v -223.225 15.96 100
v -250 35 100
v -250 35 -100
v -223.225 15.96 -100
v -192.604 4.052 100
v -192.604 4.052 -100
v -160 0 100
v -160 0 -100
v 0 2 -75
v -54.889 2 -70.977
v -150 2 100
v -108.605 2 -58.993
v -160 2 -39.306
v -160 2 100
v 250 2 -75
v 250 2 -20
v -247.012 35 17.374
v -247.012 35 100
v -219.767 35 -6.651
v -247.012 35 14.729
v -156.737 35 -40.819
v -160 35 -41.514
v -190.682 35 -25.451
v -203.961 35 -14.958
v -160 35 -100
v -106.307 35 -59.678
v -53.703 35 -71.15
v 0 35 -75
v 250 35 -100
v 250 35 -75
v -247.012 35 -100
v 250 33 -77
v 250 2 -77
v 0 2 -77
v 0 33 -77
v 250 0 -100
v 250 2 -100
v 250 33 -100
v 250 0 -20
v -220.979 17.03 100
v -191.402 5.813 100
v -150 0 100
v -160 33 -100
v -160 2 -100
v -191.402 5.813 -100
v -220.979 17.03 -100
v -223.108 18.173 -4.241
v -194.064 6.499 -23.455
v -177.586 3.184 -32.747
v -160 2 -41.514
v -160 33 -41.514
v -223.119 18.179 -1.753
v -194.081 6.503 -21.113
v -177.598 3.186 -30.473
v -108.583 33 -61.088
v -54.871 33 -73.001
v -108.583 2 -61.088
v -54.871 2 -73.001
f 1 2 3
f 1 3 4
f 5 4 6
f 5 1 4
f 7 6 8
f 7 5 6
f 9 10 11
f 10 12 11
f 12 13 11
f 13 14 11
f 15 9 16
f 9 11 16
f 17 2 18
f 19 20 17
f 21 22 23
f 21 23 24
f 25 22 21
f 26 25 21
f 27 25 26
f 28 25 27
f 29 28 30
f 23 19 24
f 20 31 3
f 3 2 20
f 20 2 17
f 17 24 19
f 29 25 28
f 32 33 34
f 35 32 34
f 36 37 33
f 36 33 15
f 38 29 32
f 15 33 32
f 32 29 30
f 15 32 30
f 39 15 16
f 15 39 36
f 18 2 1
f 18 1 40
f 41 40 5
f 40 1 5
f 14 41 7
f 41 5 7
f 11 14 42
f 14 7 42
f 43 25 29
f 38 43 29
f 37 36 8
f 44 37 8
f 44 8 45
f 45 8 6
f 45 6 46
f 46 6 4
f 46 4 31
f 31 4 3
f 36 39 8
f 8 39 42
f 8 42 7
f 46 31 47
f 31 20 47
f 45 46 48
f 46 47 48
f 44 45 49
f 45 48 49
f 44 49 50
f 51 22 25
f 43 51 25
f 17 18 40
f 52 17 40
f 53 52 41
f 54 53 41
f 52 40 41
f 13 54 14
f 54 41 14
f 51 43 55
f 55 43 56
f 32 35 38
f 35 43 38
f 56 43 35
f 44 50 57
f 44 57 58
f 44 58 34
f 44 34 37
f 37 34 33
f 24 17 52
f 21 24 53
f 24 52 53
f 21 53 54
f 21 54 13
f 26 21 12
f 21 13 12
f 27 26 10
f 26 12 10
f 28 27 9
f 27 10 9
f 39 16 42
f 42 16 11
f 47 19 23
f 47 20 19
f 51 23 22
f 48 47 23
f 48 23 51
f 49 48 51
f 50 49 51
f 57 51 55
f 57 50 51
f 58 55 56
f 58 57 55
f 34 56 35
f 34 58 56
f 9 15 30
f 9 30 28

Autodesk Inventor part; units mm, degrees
ref_plane "YZ Plane" through (0, 0, 0) normal (1, 0, 0) x (0, 1, 0)
ref_plane "XZ Plane" through (0, 0, 0) normal (0, 1, 0) x (-1, 0, 0)
ref_plane "XY Plane" through (0, 0, 0) normal (0, 0, 1) x (1, 0, 0)
sketch "スケッチ1" plane through (0, 0, 0) normal (0, 1, 0) x (-1, 0, 0)
  line L0 (250, 100) -> (-250, 100)
  line L1 (-250, 100) -> (-250, -100)
  line L2 (-250, -100) -> (250, -100)
  line L3 (250, -100) -> (250, 100)
  point P0 (0, 0)
  dimension "d2" = 250
  dimension "d3" = 500
  dimension "d4" = 100
  dimension "d5" = 200
extrude "押し出し1" add sketch "スケッチ1" along normal blind 35
sketch "スケッチ2" plane through (-250, 0, 100) normal (0, 0, 1) x (1, 0, 0)
  line L0 (0, 35) -> (500, 35) projected
  line L1 (0, 0) -> (500, 0) projected
  arc A0 (0, 35) -> (90, 0) centre (90, 133.2143) ccw
  line L2 (0, 0) -> (0, 35) projected
  point P0 (250, 0)
  dimension "d8" = 90
extrude "押し出し2" cut sketch "スケッチ2" against normal through all
sketch "スケッチ5" plane through (-160, 0, 100) normal (0, 0, 1) x (1, 0, 0)
  arc A0 (-90, 35) -> (0, 0) centre (0, 133.2143) ccw projected
  line L0 (0, 0) -> (410, 0) projected
  arc A1 (-87.0123, 35) -> (0, 2) centre (0, 133.2143) ccw
  line L1 (0, 2) -> (54.4195, 2)
  line L2 (54.4195, 2) -> (410, 2)
  line L3 (-90, 35) -> (410, 35) projected
  line L4 (410, 0) -> (410, 35) projected
  point P0 (160, 0)
  point P1 (40, 35)
  dimension "d20" = 2
extrude "押し出し5" cut sketch "スケッチ5" against normal through all contours L3 L4 L2 L1 A1
sketch "スケッチ8" plane through (-160, 2, 100) normal (0, 1, 0) x (1, 0, 0)
  line L0 (410, 175) -> (160, 175)
  line L1 (410, 200) -> (410, 0) projected
  line L2 (0, 200) -> (410, 200) projected
  arc A0 (160, 175) -> (-90, 80) centre (160, -201.4474) ccw
  line L3 (-90, 200) -> (-90, 0) projected
  line L4 (-87.0123, 200) -> (0, 200) projected
  line L5 (-87.0123, 200) -> (-90, 200) projected
  line L6 (410, 177) -> (160, 177)
  arc A1 (160, 177) -> (-90, 82.6695) centre (160, -201.4474) ccw
  line L7 (410, 175) -> (410, 177)
  line L8 (410, 0) -> (410, 200) projected
  line L9 (-90, 82.6695) -> (-90, 80)
  point P0 (160, 100)
  dimension "d35" = 25
  dimension "d36" = 120
  dimension "d37" = 250
  dimension "d38" = 2
extrude "押し出し7" add sketch "スケッチ8" along normal up to surface (33 mm away) contours L0 A0 L3 A1 L6 L1
delete faces "面を削除1" heal yes whole lump no faces at (-239.2435, 9.8792, 10.8013) (-250, 24, 18.2203) (-242.947, 2, 13.2909) (-239.2361, 9.8796, 8.2094)
sketch "スケッチ9" plane through (0, 35, -75) normal (0, 1, 0) x (1, 0, 0)
  line L0 (250, 25) -> (250, 2) projected
  line L1 (0, 2) -> (250, 2) projected
  line L2 (250, 25) -> (250, 2) projected
  line L3 (-160, 25) -> (250, 25) projected
  line L4 (-160, -33.4861) -> (-160, 25) projected
  arc A0 (0, 2) -> (-160, -33.4861) centre (0, -376.4474) ccw projected
  point P0 (0, -75)
extrude "押し出し8" add sketch "スケッチ9" against normal blind 2
sketch "スケッチ10" plane through (-160, 2, 100) normal (0, 1, 0) x (1, 0, 0)
  line L0 (410, 175) -> (410, 0) projected
  line L1 (410, 0) -> (0, 0) projected
  line L2 (410, 0) -> (410, 200) projected
  line L3 (410, 120) -> (10, 0)
  line L4 (0, 0) -> (410, 0) projected
  point P0 (160, 100)
  dimension "d43" = 400
  dimension "d44" = 120
extrude "押し出し9" cut sketch "スケッチ10" against normal through all
properties part number "endplate_ver2"
